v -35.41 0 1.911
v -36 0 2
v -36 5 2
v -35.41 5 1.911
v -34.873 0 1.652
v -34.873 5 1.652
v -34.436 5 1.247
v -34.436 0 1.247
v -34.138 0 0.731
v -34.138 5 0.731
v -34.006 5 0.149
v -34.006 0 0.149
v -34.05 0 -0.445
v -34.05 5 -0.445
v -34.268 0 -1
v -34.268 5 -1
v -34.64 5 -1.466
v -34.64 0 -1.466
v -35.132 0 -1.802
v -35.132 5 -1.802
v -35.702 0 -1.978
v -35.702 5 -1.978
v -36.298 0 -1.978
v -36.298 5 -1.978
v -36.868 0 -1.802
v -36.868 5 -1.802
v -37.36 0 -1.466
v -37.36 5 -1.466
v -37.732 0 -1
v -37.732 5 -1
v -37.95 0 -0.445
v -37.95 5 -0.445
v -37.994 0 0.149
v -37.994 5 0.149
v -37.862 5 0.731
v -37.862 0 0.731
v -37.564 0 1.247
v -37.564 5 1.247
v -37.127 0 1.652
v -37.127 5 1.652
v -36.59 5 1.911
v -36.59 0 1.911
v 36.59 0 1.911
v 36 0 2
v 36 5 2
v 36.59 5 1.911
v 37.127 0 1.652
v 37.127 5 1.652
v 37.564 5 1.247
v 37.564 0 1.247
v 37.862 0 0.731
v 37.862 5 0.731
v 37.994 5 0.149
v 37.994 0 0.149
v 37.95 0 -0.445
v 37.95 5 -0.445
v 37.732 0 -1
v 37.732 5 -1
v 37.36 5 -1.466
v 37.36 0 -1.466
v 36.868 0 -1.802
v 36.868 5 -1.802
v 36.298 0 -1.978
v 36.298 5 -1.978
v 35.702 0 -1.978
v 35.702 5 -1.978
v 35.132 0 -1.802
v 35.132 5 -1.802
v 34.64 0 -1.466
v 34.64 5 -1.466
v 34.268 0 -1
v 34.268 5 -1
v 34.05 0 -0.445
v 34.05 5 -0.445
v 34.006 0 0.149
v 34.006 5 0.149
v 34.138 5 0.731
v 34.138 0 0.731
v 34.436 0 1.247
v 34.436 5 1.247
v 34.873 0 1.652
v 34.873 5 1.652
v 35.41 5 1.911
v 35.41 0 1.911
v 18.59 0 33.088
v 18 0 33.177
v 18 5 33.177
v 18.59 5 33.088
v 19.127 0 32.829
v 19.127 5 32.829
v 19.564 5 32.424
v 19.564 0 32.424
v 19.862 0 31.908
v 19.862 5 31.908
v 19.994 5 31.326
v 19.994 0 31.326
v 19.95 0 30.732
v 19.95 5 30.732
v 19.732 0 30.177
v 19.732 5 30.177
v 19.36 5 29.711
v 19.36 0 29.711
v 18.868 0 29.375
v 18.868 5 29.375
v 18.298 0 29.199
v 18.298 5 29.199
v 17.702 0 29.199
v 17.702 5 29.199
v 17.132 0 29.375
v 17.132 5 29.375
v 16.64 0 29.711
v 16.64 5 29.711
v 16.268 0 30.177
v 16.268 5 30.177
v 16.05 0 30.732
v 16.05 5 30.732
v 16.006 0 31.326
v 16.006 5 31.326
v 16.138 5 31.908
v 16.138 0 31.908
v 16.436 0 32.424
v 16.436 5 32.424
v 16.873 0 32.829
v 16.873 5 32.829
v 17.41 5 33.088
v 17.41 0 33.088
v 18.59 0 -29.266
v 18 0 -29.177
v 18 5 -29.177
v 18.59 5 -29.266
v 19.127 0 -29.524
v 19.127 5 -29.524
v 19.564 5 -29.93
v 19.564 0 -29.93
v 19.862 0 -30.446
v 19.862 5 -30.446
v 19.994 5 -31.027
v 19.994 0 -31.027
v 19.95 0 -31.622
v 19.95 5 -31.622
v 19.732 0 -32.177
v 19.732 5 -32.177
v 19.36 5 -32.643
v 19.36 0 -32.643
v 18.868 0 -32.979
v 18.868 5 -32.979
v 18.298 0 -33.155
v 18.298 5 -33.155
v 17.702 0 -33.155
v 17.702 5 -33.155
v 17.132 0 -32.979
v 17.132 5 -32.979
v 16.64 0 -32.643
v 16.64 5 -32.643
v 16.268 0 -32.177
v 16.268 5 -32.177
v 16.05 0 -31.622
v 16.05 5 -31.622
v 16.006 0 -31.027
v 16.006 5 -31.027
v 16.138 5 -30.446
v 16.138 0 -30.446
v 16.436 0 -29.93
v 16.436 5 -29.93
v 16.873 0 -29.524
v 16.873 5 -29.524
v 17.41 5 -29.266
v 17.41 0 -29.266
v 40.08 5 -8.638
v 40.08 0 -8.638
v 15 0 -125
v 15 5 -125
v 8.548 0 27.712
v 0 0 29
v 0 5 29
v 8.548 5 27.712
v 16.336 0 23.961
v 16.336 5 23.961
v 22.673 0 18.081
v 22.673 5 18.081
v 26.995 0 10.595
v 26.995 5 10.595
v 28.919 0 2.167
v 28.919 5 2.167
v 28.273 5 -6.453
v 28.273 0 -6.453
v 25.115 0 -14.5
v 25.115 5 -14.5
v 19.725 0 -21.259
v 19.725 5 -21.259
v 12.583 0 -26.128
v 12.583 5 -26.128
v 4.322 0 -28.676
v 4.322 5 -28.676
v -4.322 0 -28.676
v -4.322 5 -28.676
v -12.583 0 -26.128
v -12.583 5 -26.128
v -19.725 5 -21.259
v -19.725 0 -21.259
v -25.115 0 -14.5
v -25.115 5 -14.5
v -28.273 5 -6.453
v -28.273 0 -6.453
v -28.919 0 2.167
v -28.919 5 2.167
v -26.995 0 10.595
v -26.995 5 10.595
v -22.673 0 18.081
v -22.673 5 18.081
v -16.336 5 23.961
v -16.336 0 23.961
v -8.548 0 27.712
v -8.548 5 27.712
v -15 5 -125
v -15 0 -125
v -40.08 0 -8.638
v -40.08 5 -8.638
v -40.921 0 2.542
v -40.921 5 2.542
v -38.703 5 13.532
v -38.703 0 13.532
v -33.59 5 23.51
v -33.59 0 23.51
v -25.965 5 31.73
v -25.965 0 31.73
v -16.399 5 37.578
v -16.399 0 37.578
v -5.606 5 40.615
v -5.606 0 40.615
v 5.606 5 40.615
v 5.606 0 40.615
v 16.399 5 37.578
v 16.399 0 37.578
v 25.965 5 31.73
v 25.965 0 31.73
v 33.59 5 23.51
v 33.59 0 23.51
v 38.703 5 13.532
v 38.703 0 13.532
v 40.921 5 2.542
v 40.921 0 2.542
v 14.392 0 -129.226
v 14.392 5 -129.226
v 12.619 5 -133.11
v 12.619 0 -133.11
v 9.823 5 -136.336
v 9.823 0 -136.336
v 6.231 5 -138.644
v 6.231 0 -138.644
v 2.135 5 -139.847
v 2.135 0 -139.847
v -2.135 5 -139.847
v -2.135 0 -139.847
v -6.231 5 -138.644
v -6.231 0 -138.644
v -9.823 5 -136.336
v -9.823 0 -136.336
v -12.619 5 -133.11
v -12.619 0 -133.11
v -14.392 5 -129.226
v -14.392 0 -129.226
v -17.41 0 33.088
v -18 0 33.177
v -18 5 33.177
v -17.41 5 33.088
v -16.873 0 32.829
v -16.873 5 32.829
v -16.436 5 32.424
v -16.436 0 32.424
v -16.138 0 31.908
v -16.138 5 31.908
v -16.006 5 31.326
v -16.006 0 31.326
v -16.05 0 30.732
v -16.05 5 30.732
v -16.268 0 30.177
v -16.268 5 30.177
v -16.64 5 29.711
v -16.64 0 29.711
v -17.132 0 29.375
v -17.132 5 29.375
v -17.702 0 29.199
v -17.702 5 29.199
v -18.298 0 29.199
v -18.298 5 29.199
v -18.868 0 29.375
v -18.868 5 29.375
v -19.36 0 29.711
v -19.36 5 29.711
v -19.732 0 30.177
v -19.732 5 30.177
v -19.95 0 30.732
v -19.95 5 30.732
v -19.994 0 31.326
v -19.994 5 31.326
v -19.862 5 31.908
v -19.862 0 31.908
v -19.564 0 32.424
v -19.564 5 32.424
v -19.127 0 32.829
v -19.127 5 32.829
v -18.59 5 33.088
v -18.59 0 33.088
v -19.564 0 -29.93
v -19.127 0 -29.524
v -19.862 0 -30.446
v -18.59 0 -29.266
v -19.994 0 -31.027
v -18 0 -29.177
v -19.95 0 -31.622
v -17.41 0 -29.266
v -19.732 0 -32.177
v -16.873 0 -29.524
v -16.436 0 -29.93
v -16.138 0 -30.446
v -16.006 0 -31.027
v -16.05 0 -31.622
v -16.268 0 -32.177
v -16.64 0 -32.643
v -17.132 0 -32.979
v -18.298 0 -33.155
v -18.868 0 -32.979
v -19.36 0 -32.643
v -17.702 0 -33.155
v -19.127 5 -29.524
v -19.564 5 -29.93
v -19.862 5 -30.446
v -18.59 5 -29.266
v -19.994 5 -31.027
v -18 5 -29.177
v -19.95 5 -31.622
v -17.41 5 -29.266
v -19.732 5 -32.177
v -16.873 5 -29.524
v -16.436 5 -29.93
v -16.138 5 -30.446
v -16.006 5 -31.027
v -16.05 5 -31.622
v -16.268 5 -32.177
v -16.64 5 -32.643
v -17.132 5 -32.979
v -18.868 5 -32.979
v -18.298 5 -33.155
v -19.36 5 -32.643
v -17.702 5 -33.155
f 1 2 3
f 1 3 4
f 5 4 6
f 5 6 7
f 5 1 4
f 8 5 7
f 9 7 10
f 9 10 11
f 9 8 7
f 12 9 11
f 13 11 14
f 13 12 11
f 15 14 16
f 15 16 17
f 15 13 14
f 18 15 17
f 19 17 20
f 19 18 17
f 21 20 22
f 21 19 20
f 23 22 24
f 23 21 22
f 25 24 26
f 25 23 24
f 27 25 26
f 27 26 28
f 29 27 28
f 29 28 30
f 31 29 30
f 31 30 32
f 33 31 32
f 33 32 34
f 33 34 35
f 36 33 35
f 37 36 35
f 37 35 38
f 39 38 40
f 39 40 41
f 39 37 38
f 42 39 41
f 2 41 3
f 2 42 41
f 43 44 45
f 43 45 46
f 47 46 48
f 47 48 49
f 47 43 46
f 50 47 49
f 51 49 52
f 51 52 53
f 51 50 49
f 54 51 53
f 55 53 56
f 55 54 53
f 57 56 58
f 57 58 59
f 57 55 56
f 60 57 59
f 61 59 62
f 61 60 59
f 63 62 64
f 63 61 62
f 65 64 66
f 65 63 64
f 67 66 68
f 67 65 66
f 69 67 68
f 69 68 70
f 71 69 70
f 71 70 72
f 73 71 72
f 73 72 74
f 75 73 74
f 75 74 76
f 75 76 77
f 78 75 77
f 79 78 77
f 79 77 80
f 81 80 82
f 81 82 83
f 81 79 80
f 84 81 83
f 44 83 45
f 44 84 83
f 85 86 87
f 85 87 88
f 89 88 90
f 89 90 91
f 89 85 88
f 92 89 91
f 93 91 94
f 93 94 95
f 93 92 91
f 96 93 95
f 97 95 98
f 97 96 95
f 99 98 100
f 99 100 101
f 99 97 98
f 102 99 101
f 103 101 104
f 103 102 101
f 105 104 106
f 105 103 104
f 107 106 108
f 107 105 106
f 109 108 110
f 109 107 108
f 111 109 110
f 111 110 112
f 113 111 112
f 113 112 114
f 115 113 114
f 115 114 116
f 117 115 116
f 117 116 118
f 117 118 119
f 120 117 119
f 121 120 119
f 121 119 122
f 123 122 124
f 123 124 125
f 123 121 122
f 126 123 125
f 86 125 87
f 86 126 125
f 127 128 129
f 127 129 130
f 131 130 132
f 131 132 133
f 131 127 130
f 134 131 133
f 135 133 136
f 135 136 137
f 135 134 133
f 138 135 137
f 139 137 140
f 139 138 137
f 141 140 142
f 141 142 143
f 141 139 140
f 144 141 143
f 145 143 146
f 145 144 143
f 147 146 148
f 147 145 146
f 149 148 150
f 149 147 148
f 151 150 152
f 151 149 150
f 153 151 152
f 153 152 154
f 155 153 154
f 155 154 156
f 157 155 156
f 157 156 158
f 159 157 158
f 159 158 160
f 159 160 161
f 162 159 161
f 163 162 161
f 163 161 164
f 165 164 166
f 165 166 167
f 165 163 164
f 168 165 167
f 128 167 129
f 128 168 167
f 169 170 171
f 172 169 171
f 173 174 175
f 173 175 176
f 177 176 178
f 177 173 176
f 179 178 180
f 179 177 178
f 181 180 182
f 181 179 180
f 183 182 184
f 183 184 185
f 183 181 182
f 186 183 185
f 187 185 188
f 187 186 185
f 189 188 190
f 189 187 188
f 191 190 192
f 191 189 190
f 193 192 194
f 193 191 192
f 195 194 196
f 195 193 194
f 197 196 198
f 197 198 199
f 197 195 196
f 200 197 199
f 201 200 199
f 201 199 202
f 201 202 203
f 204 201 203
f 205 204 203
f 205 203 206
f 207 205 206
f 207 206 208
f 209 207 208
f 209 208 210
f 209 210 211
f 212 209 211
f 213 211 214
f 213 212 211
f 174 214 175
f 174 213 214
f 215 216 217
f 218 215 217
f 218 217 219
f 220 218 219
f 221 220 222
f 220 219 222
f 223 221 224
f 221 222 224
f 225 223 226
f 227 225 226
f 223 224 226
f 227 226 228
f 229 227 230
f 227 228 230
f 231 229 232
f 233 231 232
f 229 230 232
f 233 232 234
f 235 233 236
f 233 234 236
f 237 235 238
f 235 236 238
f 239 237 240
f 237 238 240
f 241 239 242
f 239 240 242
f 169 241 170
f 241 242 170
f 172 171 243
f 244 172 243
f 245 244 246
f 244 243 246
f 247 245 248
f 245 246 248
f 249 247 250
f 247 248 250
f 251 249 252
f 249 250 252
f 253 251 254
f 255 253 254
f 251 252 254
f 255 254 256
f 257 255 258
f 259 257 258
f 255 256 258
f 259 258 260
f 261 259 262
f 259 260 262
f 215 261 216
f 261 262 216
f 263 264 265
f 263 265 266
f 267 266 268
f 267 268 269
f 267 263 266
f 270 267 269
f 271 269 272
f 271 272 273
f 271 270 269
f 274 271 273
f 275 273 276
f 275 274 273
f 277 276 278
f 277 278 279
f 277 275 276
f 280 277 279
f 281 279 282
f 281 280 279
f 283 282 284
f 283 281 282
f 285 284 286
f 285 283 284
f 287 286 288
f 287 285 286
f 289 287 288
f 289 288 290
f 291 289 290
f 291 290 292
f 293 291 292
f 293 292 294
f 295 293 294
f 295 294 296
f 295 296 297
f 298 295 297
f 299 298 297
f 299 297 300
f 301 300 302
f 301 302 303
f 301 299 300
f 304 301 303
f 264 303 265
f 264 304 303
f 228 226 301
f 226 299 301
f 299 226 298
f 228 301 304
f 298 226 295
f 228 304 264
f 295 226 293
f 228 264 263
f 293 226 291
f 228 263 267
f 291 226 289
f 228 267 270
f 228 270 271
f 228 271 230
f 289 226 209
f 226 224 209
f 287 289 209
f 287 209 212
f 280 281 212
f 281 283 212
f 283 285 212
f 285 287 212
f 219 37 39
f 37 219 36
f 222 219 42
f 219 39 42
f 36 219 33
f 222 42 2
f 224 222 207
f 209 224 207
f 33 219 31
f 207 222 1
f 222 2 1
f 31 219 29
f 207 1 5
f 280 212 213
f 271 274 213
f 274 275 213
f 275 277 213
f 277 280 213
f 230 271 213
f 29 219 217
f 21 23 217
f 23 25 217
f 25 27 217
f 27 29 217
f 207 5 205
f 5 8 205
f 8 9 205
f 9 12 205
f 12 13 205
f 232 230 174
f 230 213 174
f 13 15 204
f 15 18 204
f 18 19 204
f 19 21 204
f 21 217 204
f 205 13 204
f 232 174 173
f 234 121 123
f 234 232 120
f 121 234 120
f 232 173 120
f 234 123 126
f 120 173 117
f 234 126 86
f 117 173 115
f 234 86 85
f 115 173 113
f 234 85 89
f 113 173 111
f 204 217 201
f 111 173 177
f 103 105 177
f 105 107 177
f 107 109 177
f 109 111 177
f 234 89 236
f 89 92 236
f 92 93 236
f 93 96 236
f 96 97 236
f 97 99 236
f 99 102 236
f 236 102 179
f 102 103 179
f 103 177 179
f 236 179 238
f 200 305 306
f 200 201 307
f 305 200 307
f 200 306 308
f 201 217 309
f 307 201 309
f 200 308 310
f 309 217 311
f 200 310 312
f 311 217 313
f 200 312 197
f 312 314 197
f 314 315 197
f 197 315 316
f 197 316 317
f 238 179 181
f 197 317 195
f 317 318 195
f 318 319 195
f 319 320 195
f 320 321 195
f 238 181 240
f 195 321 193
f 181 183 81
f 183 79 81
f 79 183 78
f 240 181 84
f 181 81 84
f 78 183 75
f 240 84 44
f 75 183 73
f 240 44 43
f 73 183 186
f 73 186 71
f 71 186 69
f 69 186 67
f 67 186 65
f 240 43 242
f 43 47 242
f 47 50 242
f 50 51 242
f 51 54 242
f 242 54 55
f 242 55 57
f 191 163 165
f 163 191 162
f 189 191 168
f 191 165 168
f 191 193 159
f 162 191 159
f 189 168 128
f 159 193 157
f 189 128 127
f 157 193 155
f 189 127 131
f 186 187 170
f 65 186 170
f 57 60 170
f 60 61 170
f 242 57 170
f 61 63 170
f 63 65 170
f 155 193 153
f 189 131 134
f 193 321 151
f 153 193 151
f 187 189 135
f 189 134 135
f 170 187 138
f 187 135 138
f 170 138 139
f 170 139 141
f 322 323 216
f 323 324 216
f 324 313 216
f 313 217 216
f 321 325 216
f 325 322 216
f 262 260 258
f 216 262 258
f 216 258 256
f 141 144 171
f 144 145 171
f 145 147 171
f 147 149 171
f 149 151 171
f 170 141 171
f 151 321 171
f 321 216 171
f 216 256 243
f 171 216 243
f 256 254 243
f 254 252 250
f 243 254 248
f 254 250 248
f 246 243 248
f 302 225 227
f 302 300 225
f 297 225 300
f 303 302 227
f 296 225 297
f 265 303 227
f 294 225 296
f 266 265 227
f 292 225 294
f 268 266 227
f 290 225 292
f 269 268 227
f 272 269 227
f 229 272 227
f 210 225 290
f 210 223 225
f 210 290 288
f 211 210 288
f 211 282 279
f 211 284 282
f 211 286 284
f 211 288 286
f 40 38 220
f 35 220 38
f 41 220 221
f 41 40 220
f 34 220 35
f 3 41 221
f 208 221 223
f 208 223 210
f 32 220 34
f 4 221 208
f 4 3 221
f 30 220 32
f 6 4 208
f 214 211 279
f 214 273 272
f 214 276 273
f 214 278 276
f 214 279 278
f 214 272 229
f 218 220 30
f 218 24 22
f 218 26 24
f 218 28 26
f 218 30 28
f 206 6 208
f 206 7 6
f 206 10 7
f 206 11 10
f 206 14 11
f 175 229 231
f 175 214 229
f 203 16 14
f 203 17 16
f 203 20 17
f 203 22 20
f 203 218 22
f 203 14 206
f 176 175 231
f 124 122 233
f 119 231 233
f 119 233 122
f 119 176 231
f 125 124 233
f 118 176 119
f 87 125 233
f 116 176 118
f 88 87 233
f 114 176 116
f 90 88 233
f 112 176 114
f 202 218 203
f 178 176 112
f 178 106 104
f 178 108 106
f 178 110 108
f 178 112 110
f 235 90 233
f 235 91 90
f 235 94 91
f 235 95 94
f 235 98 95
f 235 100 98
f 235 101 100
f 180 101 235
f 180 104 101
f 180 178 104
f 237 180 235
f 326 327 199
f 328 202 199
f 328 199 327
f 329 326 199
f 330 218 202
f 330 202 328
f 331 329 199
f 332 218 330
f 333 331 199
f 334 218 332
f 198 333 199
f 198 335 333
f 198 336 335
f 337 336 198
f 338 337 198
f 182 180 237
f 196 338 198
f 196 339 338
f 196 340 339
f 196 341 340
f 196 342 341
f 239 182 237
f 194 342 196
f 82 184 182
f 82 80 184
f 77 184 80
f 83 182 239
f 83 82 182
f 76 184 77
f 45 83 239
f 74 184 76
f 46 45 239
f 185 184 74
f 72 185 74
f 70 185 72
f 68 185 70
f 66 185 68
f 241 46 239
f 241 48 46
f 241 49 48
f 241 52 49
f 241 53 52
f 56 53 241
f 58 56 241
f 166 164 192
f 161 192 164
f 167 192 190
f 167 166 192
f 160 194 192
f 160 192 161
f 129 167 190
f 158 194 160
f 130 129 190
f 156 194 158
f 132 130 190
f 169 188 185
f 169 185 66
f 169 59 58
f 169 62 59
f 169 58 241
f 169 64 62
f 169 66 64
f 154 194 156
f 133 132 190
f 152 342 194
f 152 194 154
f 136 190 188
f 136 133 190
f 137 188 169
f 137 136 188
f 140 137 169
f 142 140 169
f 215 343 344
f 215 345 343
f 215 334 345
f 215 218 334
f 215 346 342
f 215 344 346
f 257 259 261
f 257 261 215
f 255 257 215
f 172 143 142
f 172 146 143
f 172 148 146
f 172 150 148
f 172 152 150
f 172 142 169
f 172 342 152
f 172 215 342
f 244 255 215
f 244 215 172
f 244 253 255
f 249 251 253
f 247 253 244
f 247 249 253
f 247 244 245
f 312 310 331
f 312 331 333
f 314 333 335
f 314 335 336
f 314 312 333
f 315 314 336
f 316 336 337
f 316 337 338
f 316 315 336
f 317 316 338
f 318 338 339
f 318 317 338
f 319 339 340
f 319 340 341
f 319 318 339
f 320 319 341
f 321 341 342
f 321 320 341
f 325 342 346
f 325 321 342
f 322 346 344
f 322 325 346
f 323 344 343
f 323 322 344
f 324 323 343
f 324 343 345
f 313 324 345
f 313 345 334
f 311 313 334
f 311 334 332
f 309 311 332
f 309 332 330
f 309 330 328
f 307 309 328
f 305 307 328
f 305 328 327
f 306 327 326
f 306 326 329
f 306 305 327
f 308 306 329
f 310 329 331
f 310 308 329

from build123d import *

# Parameters (mm, degrees)
SKETCH1_R           = 29
SKETCH1_R_2         = 2
BOSS_EXTRUDE1_DEPTH = 5


with BuildPart() as part:
    # Sketch1 → Boss-Extrude1 (new body)
    with BuildSketch(Plane(origin=(0, 0, 0), x_dir=(1, 0, 0), z_dir=(0, 1, 0))):
        with BuildLine():
            Line((-15, 125), (-40.079636882, 8.638443574))
            ThreePointArc((-40.079636882, 8.638443574), (0, -41), (40.079636882, 8.638443574))
            Line((40.079636882, 8.638443574), (15, 125))
            ThreePointArc((15, 125), (0, 140), (-15, 125))
        make_face()
        Circle(SKETCH1_R, mode=Mode.SUBTRACT)
        with Locations((36, 0)):
            Circle(SKETCH1_R_2, mode=Mode.SUBTRACT)
        with Locations((18, -31.176914536)):
            Circle(SKETCH1_R_2, mode=Mode.SUBTRACT)
        with Locations((-18, -31.176914536)):
            Circle(SKETCH1_R_2, mode=Mode.SUBTRACT)
        with Locations((-36, 0)):
            Circle(SKETCH1_R_2, mode=Mode.SUBTRACT)
        with Locations((-18, 31.176914536)):
            Circle(SKETCH1_R_2, mode=Mode.SUBTRACT)
        with Locations((18, 31.176914536)):
            Circle(SKETCH1_R_2, mode=Mode.SUBTRACT)
    extrude(amount=BOSS_EXTRUDE1_DEPTH)


solid = part.part
